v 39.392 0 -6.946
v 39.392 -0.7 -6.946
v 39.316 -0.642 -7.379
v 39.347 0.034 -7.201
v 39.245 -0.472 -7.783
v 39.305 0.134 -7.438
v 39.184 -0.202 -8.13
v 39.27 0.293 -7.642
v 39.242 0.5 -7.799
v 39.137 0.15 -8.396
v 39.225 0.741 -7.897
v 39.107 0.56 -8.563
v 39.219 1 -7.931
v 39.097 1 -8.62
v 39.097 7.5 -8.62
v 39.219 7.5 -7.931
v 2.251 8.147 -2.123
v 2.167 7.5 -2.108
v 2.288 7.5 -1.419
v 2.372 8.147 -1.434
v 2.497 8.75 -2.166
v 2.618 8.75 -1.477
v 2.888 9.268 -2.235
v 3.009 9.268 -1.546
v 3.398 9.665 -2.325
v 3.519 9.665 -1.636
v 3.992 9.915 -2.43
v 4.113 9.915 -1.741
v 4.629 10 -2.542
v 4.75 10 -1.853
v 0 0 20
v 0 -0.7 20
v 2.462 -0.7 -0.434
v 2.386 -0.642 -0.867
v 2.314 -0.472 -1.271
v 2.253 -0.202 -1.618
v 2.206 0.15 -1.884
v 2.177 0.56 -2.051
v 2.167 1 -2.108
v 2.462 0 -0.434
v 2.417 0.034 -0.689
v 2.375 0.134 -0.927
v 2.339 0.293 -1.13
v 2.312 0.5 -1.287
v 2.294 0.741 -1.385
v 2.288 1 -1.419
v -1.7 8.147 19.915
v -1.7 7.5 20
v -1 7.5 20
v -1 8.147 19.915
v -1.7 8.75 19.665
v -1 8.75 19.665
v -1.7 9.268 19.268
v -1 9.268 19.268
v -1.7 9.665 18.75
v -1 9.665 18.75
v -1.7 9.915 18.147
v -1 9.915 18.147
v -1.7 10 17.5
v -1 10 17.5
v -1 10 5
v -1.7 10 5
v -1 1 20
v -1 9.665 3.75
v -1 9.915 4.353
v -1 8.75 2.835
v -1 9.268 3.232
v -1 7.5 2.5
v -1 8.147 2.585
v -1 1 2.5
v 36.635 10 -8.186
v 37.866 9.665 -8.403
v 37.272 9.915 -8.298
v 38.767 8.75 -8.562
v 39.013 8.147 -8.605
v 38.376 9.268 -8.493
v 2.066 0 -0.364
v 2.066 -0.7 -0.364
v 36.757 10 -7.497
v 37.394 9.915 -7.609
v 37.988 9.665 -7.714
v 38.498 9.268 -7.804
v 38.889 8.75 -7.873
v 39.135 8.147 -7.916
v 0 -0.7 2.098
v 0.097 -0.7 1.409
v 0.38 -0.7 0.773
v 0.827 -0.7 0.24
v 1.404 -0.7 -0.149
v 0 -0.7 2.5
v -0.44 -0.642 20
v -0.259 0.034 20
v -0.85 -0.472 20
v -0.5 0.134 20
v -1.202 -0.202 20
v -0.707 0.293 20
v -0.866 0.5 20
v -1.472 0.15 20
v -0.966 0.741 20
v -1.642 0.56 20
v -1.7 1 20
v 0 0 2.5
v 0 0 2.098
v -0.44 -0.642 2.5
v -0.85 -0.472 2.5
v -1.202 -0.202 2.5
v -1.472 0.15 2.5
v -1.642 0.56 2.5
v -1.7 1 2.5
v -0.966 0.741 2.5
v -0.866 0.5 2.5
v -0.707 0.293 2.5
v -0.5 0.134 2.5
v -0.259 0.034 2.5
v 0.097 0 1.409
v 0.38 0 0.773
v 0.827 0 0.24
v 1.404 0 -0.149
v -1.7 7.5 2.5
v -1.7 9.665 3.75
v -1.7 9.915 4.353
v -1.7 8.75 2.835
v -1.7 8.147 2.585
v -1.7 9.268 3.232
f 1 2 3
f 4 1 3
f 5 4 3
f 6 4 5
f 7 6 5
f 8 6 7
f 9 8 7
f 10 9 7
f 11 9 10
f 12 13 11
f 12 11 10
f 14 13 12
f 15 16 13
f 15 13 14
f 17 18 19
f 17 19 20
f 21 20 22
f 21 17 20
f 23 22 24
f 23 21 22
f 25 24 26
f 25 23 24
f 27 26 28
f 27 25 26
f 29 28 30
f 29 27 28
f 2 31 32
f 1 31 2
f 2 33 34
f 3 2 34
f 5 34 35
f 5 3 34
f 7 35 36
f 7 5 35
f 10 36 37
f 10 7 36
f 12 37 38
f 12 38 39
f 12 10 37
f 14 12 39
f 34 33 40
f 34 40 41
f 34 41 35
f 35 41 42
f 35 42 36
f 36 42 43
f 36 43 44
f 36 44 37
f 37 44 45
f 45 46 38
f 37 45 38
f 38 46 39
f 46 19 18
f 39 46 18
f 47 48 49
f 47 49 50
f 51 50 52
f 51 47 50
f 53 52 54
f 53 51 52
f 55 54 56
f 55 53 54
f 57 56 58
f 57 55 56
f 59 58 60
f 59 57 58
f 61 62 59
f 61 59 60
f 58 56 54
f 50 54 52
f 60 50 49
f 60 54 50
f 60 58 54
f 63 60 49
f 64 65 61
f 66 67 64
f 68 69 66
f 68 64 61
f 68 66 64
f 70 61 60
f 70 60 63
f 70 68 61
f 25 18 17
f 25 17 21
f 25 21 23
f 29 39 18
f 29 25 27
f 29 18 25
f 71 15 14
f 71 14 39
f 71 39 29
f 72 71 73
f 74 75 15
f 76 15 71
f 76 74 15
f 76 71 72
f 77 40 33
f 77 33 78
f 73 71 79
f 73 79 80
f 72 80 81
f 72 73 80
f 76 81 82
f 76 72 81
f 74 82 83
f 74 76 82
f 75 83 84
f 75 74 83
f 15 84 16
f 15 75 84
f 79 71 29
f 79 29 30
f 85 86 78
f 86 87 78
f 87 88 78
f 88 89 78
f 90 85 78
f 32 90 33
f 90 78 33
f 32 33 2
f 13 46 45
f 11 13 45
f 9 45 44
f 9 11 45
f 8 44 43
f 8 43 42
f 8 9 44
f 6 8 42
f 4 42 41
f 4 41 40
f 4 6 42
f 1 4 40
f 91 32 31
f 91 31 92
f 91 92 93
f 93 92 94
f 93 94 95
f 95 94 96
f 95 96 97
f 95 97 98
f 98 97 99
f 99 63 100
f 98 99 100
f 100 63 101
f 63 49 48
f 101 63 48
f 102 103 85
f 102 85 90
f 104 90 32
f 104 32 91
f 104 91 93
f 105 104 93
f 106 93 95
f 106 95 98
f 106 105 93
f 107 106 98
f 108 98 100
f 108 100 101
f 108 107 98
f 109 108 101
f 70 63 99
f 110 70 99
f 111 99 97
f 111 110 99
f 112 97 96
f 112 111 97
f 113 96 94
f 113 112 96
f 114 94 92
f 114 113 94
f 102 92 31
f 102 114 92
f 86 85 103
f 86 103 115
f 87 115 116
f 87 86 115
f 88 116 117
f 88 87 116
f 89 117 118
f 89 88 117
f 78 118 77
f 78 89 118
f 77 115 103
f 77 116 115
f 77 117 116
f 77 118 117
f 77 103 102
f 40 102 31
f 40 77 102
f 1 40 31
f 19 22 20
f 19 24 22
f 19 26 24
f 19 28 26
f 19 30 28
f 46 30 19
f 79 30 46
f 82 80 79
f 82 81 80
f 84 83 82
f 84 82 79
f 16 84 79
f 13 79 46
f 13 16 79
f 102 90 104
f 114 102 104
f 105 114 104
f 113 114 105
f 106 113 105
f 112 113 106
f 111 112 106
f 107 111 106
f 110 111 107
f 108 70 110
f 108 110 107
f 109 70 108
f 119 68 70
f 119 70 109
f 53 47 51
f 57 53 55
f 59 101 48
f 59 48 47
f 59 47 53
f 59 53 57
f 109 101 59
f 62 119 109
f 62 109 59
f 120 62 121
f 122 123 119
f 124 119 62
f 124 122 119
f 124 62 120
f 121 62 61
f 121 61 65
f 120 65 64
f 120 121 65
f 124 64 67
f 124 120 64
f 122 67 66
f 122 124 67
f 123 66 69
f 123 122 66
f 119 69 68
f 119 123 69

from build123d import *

# Parameters (mm, degrees)
BASE_FLANGE1_DEPTH      = 0.7
EDGE_FLANGE1_DEPTH      = 17.5
EDGE_FLANGE1_BEND_DEPTH = 37.5
BREAK_CORNER1_START     = -1.7
BREAK_CORNER1_DEPTH     = 0.7
BREAK_CORNER1_2_DEPTH   = 0.7
BREAK_CORNER1_START_2   = -0.7
BREAK_CORNER1_3_DEPTH   = 0.7


# Read off the part's stored shape, not the designer's step: Break-Corner1
# Sheet-metal steps are written as plain solids
with BuildPart() as part:
    # Sketch1 → Base-Flange1 (new body)
    with BuildSketch(Plane(origin=(0, 0, 0), x_dir=(1, 0, 0), z_dir=(0, 1, 0))):
        Polygon((0, 0), (0, -20), (39.39231012, 6.945927107), align=None)
    extrude(amount=-BASE_FLANGE1_DEPTH)

    # Edge-Flange1 section (across the edge) → Edge-Flange1 (add)
    with BuildSketch(Plane(origin=(-1, 0, 2.5), x_dir=(1, 0, 0), z_dir=(0, 0, 1))):
        with BuildLine():
            Line((-0.7, 1), (-0.7, 10))
            Line((-0.7, 10), (0, 10))
            Line((0, 10), (0, 1))
            ThreePointArc((0, 1), (0.292893219, 0.292893219), (1, 0))
            Line((1, 0), (1, -0.7))
            ThreePointArc((1, -0.7), (-0.202081528, -0.202081528), (-0.7, 1))
        make_face()
    extrude(amount=EDGE_FLANGE1_DEPTH)

    # Edge-Flange1 section 2 (across the edge) → Edge-Flange1 bend (add)
    with BuildSketch(Plane(origin=(39.218661943, 0, -7.93073486), x_dir=(0.1736481776669273, 3.4914813388431334e-15, 0.9848077530122086), z_dir=(-0.9848077530122086, 0, 0.1736481776669273))):
        with BuildLine():
            Line((-0.7, 1), (-0.7, 10))
            Line((-0.7, 10), (0, 10))
            Line((0, 10), (0, 1))
            ThreePointArc((0, 1), (0.292893219, 0.292893219), (1, 0))
            Line((1, 0), (1, -0.7))
            ThreePointArc((1, -0.7), (-0.202081528, -0.202081528), (-0.7, 1))
        make_face()
    extrude(amount=EDGE_FLANGE1_BEND_DEPTH)

    # Break-Corner1 outline → Break-Corner1 (cut)
    with BuildSketch(Plane(origin=(0, 0, 0), x_dir=(0.9848077530122086, 0, -0.173648177666927), z_dir=(0.17364817766692697, 0, 0.9848077530122088)).offset(BREAK_CORNER1_START)):
        with BuildLine():
            ThreePointArc((2.5, 7.5), (3.232233047, 9.267766953), (5, 10))
            Line((5, 10), (2.5, 10))
            Line((2.5, 10), (2.5, 7.5))
        make_face()
        with BuildLine():
            ThreePointArc((37.5, 10), (39.267766953, 9.267766953), (40, 7.5))
            Line((40, 7.5), (40, 10))
            Line((40, 10), (37.5, 10))
        make_face()
    extrude(amount=BREAK_CORNER1_DEPTH, mode=Mode.SUBTRACT)

    # Break-Corner1 2 outline → Break-Corner1 2 (cut)
    with BuildSketch(Plane.YZ.offset(BREAK_CORNER1_START)):
        with BuildLine():
            ThreePointArc((7.5, 20), (9.267766953, 19.267766953), (10, 17.5))
            Line((10, 17.5), (10, 20))
            Line((10, 20), (7.5, 20))
        make_face()
        with BuildLine():
            ThreePointArc((10, 5), (9.267766953, 3.232233047), (7.5, 2.5))
            Line((7.5, 2.5), (10, 2.5))
            Line((10, 2.5), (10, 5))
        make_face()
    extrude(amount=BREAK_CORNER1_2_DEPTH, mode=Mode.SUBTRACT)

    # Break-Corner1 3 outline → Break-Corner1 3 (cut)
    with BuildSketch(Plane(origin=(0, 0, 0), x_dir=(1, 0, 0), z_dir=(0, 1, 0)).offset(BREAK_CORNER1_START_2)):
        with BuildLine():
            ThreePointArc((0, -2.097749078), (0.584888892, -0.490780054), (2.065879556, 0.364270305))
            Line((2.065879556, 0.364270305), (0, 0))
            Line((0, 0), (0, -2.097749078))
        make_face()
    extrude(amount=BREAK_CORNER1_3_DEPTH, mode=Mode.SUBTRACT)


solid = part.part
